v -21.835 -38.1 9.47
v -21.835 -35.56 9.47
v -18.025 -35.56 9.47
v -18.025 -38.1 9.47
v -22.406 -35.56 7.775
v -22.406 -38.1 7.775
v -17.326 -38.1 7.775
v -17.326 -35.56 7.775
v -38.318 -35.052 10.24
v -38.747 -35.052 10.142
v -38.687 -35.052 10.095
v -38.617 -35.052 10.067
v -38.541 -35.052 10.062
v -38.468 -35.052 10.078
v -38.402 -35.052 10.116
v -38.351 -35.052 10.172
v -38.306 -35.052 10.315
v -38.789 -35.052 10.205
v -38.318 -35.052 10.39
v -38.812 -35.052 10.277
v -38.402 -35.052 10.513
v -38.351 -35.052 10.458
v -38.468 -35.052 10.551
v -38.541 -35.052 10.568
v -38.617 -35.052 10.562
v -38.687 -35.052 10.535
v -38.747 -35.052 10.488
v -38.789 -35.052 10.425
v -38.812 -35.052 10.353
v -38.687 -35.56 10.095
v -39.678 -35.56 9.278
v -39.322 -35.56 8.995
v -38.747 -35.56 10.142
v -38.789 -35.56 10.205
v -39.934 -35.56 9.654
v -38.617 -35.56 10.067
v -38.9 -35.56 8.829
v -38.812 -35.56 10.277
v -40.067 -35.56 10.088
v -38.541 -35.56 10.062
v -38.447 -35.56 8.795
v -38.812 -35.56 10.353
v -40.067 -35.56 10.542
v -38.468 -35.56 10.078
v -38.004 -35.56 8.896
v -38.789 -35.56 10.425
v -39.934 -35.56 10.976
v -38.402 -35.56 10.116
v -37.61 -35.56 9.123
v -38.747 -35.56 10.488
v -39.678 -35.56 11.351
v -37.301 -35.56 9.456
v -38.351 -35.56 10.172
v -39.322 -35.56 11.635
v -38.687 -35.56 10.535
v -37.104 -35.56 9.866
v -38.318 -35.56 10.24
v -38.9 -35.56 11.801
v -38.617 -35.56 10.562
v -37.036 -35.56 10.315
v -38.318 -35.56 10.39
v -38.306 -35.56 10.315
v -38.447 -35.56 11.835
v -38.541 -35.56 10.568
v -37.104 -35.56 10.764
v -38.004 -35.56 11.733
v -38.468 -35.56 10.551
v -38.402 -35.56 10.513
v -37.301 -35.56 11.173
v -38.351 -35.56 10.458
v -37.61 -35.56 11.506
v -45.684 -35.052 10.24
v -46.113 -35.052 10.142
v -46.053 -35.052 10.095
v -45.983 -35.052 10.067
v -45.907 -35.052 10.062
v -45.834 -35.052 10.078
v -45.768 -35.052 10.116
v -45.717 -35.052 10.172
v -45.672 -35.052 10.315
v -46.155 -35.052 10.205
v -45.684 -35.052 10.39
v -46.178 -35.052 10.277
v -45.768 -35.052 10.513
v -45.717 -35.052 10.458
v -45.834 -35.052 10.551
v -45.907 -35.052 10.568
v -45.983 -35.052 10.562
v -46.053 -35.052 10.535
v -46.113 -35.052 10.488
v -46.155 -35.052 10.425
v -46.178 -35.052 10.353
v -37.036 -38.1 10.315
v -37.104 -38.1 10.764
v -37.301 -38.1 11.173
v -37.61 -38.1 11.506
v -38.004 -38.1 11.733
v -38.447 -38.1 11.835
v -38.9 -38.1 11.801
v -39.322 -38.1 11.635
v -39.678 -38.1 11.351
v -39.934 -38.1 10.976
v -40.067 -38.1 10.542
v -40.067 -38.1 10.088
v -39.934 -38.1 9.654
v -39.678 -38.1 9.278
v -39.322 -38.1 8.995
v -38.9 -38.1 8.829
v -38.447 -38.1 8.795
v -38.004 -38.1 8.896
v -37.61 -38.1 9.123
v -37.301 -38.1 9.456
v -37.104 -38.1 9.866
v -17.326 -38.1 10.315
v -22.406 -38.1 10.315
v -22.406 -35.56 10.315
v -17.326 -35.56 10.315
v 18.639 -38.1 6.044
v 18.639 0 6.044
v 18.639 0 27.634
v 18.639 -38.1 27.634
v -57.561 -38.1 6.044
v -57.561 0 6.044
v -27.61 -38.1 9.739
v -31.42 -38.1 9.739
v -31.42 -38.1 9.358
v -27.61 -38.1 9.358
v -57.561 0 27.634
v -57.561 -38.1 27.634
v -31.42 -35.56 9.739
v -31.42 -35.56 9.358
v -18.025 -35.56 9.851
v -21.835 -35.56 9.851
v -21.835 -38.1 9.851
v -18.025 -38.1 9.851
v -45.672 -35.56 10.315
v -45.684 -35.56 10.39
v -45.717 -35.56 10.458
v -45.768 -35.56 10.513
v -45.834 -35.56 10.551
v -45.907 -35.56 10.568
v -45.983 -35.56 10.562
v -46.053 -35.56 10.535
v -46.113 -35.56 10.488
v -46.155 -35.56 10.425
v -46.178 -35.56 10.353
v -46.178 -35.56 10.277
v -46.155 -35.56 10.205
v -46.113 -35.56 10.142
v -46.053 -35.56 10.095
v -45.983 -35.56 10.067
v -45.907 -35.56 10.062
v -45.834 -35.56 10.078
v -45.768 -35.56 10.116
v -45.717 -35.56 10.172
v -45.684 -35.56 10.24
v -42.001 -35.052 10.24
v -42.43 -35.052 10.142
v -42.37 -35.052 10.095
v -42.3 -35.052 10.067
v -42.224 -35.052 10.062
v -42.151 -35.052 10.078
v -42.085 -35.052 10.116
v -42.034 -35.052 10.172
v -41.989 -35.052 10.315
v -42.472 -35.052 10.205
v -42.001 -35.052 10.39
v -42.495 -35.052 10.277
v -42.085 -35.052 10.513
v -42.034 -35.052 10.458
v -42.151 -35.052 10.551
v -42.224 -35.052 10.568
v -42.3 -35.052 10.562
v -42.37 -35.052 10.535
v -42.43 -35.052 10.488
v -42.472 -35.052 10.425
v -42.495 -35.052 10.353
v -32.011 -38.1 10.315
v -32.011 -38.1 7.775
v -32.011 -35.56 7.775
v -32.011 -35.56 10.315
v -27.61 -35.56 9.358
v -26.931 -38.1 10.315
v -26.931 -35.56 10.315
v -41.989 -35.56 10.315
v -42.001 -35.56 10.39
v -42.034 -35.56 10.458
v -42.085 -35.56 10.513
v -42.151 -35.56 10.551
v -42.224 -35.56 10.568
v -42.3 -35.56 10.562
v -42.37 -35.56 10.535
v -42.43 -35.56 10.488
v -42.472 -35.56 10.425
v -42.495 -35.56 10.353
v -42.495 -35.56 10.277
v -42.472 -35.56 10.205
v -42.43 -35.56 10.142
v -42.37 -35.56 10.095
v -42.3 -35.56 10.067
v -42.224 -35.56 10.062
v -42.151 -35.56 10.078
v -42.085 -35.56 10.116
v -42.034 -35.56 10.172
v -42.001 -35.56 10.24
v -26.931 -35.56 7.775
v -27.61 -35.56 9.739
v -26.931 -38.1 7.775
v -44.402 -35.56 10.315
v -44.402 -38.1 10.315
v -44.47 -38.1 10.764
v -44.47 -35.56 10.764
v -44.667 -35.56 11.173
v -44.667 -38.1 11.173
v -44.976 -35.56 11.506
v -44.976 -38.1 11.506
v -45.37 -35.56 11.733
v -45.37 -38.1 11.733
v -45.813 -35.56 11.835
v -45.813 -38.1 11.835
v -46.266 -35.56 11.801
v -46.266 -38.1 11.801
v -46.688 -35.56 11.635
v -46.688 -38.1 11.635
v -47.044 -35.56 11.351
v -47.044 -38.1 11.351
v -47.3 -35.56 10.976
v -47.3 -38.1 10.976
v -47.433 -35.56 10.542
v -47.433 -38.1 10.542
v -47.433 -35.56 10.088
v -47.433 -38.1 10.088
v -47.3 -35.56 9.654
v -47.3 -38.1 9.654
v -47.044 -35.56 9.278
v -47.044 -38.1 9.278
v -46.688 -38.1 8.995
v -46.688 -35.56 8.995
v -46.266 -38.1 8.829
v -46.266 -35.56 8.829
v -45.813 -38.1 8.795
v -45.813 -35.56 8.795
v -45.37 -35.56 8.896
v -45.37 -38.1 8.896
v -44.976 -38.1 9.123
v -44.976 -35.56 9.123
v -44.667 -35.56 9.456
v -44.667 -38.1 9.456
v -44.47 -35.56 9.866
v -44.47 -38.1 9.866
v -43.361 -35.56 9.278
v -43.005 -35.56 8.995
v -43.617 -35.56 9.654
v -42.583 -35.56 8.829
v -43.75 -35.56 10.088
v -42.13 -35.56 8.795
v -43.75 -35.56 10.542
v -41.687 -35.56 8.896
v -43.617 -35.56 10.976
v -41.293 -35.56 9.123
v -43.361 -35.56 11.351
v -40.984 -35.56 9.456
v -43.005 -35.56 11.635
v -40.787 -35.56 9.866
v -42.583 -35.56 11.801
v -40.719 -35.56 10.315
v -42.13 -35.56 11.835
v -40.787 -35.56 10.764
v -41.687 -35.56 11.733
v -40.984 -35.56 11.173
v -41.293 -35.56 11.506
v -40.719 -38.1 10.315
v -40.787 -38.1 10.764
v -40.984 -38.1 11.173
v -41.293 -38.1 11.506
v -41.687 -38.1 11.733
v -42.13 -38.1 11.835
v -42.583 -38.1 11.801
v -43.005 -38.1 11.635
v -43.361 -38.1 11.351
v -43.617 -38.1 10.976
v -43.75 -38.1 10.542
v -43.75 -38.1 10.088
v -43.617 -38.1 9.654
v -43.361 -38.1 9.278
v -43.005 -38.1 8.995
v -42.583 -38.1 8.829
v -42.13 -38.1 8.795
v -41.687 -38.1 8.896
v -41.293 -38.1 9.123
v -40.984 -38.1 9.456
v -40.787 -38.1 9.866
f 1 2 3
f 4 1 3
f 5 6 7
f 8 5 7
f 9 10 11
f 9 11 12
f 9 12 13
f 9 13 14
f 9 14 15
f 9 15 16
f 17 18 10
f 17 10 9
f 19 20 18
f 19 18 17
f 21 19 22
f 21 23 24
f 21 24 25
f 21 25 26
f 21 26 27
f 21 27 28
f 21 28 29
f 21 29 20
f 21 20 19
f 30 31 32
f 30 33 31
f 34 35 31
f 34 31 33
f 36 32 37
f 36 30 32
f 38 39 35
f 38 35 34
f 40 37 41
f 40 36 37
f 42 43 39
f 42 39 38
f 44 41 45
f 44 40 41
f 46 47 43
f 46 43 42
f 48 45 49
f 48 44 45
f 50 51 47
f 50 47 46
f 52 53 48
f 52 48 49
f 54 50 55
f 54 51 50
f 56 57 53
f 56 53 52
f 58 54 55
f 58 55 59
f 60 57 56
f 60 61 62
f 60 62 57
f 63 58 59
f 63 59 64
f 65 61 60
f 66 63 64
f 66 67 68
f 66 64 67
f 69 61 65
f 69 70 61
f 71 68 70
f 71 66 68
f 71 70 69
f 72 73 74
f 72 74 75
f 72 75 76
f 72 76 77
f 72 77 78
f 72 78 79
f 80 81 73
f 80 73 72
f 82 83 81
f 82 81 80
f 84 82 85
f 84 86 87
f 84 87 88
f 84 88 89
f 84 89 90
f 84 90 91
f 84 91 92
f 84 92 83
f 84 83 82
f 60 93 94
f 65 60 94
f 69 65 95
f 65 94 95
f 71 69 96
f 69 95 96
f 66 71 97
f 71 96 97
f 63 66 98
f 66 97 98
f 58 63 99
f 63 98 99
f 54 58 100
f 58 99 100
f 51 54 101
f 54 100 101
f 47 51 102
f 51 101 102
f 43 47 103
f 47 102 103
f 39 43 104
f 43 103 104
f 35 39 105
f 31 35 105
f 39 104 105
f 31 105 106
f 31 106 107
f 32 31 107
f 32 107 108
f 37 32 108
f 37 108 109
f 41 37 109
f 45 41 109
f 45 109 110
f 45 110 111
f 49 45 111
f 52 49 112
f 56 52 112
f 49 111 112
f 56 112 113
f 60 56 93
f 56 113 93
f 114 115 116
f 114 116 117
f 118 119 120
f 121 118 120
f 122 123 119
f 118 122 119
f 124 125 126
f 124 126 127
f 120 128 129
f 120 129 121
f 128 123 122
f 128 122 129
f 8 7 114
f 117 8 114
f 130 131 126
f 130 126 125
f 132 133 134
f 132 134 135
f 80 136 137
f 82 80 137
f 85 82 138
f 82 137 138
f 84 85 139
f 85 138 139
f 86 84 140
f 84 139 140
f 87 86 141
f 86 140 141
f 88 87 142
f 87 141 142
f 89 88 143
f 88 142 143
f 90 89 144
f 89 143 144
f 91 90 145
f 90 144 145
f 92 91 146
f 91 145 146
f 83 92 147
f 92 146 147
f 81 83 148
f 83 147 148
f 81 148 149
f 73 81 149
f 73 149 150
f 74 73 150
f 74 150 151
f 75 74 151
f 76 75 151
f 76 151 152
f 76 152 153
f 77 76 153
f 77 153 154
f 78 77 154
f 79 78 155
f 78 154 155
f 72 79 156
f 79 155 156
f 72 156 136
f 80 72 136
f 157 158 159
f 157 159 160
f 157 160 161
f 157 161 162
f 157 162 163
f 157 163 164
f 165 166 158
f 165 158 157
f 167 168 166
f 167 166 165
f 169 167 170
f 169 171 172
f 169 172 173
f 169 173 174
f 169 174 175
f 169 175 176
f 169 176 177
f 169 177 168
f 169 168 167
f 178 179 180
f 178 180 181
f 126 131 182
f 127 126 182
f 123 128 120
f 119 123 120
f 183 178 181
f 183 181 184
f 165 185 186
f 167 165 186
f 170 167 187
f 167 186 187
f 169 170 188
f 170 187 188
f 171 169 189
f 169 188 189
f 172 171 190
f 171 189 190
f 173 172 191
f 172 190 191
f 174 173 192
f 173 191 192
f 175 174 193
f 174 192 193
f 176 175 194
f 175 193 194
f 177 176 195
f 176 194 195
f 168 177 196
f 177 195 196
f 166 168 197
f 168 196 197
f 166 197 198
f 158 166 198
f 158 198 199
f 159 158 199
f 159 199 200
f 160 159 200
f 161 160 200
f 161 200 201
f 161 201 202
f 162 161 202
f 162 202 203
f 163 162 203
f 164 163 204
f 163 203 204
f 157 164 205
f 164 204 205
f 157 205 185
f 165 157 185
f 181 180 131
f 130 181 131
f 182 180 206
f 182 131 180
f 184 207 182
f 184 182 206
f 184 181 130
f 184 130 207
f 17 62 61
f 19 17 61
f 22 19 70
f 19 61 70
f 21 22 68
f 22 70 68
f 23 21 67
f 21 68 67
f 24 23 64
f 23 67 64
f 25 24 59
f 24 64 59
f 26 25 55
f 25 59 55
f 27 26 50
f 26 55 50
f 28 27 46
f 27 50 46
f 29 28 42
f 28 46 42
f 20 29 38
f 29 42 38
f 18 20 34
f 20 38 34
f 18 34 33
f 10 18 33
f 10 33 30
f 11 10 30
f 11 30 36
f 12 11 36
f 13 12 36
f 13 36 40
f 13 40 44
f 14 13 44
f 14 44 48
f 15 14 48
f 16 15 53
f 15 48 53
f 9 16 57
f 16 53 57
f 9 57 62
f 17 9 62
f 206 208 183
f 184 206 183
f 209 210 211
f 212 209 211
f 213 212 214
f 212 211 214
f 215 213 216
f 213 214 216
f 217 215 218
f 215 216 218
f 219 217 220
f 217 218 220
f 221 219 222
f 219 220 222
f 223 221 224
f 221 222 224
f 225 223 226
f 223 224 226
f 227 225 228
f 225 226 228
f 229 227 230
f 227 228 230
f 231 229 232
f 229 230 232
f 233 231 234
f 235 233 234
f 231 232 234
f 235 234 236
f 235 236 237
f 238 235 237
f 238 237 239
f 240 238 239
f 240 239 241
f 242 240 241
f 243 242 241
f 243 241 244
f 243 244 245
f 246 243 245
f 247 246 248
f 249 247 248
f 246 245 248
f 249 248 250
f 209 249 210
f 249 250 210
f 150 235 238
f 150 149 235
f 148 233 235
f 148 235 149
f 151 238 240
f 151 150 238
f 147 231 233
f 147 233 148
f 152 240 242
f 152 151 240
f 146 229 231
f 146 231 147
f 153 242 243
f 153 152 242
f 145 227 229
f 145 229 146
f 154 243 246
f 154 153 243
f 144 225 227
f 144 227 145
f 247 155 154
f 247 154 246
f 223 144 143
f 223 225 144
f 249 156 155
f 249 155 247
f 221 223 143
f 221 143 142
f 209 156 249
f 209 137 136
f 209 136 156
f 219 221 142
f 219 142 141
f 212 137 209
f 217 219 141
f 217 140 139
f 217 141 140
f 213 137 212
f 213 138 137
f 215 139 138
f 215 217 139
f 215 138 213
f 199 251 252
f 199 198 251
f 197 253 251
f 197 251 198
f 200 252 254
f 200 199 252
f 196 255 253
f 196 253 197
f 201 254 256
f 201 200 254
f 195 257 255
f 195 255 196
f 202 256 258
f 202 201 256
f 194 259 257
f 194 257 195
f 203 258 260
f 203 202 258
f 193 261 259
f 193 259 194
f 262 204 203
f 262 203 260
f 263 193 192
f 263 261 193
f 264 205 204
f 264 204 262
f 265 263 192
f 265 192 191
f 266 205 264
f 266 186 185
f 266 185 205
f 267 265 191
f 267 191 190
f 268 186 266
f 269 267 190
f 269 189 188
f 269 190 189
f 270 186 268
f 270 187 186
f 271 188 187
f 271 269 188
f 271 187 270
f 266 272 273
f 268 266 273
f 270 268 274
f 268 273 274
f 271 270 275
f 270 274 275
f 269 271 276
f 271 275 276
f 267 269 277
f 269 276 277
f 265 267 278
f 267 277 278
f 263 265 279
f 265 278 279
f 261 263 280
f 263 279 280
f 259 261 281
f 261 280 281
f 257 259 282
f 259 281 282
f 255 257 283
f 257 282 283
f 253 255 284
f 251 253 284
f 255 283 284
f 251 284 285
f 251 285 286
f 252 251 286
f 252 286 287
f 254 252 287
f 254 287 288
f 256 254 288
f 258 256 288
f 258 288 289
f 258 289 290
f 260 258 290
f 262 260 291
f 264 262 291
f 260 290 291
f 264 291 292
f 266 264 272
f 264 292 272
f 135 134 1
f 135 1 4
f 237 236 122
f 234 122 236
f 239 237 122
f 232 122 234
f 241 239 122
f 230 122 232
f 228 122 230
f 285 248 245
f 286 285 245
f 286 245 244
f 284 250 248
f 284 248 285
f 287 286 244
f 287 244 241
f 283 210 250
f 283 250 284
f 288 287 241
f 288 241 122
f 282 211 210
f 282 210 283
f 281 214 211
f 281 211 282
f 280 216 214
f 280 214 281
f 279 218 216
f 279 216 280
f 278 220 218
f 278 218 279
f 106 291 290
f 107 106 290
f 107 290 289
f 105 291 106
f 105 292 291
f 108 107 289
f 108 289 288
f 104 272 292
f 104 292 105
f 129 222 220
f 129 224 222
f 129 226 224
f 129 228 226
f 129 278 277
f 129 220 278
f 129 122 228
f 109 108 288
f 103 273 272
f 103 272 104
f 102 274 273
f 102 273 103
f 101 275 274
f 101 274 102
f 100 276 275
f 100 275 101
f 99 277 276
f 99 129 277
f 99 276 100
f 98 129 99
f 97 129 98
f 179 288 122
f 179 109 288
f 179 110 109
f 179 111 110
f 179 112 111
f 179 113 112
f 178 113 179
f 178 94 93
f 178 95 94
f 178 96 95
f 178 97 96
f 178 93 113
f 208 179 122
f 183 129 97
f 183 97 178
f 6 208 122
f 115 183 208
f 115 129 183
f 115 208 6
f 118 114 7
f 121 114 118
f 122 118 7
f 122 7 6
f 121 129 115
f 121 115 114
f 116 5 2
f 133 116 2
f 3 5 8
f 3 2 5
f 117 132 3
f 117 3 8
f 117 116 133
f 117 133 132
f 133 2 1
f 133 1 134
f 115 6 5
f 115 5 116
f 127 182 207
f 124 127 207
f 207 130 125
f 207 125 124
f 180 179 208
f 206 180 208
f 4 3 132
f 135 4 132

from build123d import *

# Parameters (mm, degrees)
F0_W      = 76.2
F0_H      = 21.59
F1_DEPTH  = 38.1
F2_W      = 5.08
F2_H      = 2.54
F2_R      = 1.524
F3_DEPTH  = 2.54
F4_R      = 0.254
F5_DEPTH  = 0.508
F6_R      = 0.254
F7_DEPTH  = 0.508
F8_R      = 0.254
F9_DEPTH  = 0.508
F10_W     = 3.81
F10_H     = 0.381
F11_DEPTH = 2.54
F12_W     = 3.81
F12_H     = 0.381
F13_DEPTH = 2.54


with BuildPart() as f1:
    # F0 (on Front) → F1 (new body)
    with BuildSketch(Plane.XZ):
        with Locations((-19.461152, 16.838921)):
            Rectangle(F0_W, F0_H)
    extrude(amount=F1_DEPTH)

    # F2 (on face) → F3 (cut)
    with BuildSketch(Plane.XZ.offset(38.1)):
        with Locations((-19.865747, 9.044795)):
            Rectangle(F2_W, F2_H)
        with Locations((-29.470715, 9.044795)):
            Rectangle(F2_W, F2_H)
        with Locations((-38.560475, 10.314795)):
            Circle(F2_R)
        with Locations((-42.243475, 10.314795)):
            Circle(F2_R)
        with Locations((-45.926475, 10.314795)):
            Circle(F2_R)
    extrude(amount=-F3_DEPTH, mode=Mode.SUBTRACT)

    # F4 (on face) → F5 (cut)
    with BuildSketch(Plane.XZ.offset(35.56)):
        with Locations((-42.243475, 10.314795)):
            Circle(F4_R)
    extrude(amount=-F5_DEPTH, mode=Mode.SUBTRACT)

    # F6 (on face) → F7 (cut)
    with BuildSketch(Plane.XZ.offset(35.56)):
        with Locations((-38.560475, 10.314795)):
            Circle(F6_R)
    extrude(amount=-F7_DEPTH, mode=Mode.SUBTRACT)

    # F8 (on face) → F9 (cut)
    with BuildSketch(Plane.XZ.offset(35.56)):
        with Locations((-45.926475, 10.314795)):
            Circle(F8_R)
    extrude(amount=-F9_DEPTH, mode=Mode.SUBTRACT)

    # F10 (on face) → F11 (join, through all)
    with BuildSketch(Plane.XZ.offset(35.56)):
        with Locations((-29.515222, 9.548081)):
            Rectangle(F10_W, F10_H)
    extrude(amount=F11_DEPTH)

    # F12 (on face) → F13 (join, through all)
    with BuildSketch(Plane.XZ.offset(35.56)):
        with Locations((-19.929768, 9.660184)):
            Rectangle(F12_W, F12_H)
    extrude(amount=F13_DEPTH)


solid = f1.part
